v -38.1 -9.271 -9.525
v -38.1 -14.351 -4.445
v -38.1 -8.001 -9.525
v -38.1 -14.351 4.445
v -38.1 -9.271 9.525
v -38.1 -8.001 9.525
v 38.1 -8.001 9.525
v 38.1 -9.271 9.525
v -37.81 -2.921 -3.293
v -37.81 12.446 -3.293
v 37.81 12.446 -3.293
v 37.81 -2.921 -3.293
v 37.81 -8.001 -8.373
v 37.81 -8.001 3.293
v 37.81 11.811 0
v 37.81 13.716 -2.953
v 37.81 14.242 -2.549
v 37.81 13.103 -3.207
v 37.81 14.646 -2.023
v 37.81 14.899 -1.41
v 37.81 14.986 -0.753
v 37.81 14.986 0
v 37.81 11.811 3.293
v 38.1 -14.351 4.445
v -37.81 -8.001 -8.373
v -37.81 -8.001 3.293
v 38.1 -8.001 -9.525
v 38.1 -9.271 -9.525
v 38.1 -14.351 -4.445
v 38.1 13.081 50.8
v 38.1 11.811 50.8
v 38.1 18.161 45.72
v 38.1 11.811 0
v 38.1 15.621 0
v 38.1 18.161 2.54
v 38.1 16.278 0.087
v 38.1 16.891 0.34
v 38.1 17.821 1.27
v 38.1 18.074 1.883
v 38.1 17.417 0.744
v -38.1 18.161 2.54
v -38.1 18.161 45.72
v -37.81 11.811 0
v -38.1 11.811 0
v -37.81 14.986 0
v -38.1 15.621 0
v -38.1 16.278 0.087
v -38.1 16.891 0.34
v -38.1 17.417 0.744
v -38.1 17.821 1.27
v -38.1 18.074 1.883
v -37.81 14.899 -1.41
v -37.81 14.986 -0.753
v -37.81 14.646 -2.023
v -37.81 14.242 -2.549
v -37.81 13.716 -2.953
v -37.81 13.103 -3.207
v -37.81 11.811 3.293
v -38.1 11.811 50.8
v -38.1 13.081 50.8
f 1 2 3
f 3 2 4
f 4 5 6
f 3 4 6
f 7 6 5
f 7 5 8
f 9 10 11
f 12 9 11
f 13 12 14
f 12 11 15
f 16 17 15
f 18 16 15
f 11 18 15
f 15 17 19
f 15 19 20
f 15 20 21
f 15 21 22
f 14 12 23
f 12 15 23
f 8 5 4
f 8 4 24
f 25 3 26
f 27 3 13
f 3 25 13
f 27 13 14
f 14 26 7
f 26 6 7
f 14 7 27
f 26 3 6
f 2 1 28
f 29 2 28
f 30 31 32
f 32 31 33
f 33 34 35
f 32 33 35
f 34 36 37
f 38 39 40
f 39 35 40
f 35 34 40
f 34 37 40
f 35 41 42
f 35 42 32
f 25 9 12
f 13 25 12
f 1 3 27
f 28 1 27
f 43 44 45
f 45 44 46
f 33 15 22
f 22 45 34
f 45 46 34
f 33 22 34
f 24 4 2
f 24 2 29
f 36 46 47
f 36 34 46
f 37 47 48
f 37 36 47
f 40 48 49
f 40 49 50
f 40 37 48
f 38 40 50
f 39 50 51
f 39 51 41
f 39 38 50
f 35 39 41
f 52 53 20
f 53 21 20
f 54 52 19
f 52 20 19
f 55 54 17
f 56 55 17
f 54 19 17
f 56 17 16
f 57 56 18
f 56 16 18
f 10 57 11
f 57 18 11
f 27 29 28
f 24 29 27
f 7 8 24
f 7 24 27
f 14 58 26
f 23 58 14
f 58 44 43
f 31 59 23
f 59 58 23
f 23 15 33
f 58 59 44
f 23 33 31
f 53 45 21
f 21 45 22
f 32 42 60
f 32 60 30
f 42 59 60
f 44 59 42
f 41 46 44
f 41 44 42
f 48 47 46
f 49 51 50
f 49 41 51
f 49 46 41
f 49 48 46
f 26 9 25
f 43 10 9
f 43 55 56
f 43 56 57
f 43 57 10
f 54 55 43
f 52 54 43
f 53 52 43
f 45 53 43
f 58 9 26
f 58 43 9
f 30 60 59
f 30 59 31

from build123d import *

# Parameters (mm, degrees)
F0_W     = 76.2
F0_H     = 6.35
F1_DEPTH = 50.8
F2_W     = 75.6192132831
F2_H     = 6.5861893818
F3_DEPTH = 25.4
F4_R     = 2.54
F5_SIZE  = 5.08
F7_DEPTH = 9.525
F9_SIZE  = 5.08


with BuildPart() as f1:
    # F0 (on Top) → F1 (new body)
    with BuildSketch(Plane.XY):
        Rectangle(F0_W, F0_H)
    extrude(amount=F1_DEPTH)

    # F2 (on Front) → F3 (join)
    with BuildSketch(Plane.XZ):
        Rectangle(F2_W, F2_H)
    extrude(amount=F3_DEPTH)

    # F4
    f4_edges = [f1.edges().sort_by_distance(p)[0] for p in [
        (0, 0, -3.293095),
        (0, 3.175, 0),
    ]]
    fillet(f4_edges, radius=F4_R)

    # F5
    f5_edges = [f1.edges().sort_by_distance(p)[0] for p in [
        (0, 3.175, 50.8),
    ]]
    chamfer(f5_edges, length=F5_SIZE)


with BuildPart() as f1_1:
    # F6: moved
    add(f1.part.moved(Location((0, 26.162, 0))))

    # F0 (on Top) → F7 (join, symmetric)
    with BuildSketch(Plane.XY):
        Rectangle(F0_W, F0_H)
    extrude(amount=F7_DEPTH, both=True)


with BuildPart() as f1_2:
    # F8: moved
    add(f1_1.part.moved(Location((0, -11.176, 0))))

    # F9
    f9_edges = [f1_2.edges().sort_by_distance(p)[0] for p in [
        (0, -8.001, -3.293095),
        (0, -14.351, -9.525),
        (0, -14.351, 9.525),
    ]]
    chamfer(f9_edges, length=F9_SIZE)


solid = f1_2.part
